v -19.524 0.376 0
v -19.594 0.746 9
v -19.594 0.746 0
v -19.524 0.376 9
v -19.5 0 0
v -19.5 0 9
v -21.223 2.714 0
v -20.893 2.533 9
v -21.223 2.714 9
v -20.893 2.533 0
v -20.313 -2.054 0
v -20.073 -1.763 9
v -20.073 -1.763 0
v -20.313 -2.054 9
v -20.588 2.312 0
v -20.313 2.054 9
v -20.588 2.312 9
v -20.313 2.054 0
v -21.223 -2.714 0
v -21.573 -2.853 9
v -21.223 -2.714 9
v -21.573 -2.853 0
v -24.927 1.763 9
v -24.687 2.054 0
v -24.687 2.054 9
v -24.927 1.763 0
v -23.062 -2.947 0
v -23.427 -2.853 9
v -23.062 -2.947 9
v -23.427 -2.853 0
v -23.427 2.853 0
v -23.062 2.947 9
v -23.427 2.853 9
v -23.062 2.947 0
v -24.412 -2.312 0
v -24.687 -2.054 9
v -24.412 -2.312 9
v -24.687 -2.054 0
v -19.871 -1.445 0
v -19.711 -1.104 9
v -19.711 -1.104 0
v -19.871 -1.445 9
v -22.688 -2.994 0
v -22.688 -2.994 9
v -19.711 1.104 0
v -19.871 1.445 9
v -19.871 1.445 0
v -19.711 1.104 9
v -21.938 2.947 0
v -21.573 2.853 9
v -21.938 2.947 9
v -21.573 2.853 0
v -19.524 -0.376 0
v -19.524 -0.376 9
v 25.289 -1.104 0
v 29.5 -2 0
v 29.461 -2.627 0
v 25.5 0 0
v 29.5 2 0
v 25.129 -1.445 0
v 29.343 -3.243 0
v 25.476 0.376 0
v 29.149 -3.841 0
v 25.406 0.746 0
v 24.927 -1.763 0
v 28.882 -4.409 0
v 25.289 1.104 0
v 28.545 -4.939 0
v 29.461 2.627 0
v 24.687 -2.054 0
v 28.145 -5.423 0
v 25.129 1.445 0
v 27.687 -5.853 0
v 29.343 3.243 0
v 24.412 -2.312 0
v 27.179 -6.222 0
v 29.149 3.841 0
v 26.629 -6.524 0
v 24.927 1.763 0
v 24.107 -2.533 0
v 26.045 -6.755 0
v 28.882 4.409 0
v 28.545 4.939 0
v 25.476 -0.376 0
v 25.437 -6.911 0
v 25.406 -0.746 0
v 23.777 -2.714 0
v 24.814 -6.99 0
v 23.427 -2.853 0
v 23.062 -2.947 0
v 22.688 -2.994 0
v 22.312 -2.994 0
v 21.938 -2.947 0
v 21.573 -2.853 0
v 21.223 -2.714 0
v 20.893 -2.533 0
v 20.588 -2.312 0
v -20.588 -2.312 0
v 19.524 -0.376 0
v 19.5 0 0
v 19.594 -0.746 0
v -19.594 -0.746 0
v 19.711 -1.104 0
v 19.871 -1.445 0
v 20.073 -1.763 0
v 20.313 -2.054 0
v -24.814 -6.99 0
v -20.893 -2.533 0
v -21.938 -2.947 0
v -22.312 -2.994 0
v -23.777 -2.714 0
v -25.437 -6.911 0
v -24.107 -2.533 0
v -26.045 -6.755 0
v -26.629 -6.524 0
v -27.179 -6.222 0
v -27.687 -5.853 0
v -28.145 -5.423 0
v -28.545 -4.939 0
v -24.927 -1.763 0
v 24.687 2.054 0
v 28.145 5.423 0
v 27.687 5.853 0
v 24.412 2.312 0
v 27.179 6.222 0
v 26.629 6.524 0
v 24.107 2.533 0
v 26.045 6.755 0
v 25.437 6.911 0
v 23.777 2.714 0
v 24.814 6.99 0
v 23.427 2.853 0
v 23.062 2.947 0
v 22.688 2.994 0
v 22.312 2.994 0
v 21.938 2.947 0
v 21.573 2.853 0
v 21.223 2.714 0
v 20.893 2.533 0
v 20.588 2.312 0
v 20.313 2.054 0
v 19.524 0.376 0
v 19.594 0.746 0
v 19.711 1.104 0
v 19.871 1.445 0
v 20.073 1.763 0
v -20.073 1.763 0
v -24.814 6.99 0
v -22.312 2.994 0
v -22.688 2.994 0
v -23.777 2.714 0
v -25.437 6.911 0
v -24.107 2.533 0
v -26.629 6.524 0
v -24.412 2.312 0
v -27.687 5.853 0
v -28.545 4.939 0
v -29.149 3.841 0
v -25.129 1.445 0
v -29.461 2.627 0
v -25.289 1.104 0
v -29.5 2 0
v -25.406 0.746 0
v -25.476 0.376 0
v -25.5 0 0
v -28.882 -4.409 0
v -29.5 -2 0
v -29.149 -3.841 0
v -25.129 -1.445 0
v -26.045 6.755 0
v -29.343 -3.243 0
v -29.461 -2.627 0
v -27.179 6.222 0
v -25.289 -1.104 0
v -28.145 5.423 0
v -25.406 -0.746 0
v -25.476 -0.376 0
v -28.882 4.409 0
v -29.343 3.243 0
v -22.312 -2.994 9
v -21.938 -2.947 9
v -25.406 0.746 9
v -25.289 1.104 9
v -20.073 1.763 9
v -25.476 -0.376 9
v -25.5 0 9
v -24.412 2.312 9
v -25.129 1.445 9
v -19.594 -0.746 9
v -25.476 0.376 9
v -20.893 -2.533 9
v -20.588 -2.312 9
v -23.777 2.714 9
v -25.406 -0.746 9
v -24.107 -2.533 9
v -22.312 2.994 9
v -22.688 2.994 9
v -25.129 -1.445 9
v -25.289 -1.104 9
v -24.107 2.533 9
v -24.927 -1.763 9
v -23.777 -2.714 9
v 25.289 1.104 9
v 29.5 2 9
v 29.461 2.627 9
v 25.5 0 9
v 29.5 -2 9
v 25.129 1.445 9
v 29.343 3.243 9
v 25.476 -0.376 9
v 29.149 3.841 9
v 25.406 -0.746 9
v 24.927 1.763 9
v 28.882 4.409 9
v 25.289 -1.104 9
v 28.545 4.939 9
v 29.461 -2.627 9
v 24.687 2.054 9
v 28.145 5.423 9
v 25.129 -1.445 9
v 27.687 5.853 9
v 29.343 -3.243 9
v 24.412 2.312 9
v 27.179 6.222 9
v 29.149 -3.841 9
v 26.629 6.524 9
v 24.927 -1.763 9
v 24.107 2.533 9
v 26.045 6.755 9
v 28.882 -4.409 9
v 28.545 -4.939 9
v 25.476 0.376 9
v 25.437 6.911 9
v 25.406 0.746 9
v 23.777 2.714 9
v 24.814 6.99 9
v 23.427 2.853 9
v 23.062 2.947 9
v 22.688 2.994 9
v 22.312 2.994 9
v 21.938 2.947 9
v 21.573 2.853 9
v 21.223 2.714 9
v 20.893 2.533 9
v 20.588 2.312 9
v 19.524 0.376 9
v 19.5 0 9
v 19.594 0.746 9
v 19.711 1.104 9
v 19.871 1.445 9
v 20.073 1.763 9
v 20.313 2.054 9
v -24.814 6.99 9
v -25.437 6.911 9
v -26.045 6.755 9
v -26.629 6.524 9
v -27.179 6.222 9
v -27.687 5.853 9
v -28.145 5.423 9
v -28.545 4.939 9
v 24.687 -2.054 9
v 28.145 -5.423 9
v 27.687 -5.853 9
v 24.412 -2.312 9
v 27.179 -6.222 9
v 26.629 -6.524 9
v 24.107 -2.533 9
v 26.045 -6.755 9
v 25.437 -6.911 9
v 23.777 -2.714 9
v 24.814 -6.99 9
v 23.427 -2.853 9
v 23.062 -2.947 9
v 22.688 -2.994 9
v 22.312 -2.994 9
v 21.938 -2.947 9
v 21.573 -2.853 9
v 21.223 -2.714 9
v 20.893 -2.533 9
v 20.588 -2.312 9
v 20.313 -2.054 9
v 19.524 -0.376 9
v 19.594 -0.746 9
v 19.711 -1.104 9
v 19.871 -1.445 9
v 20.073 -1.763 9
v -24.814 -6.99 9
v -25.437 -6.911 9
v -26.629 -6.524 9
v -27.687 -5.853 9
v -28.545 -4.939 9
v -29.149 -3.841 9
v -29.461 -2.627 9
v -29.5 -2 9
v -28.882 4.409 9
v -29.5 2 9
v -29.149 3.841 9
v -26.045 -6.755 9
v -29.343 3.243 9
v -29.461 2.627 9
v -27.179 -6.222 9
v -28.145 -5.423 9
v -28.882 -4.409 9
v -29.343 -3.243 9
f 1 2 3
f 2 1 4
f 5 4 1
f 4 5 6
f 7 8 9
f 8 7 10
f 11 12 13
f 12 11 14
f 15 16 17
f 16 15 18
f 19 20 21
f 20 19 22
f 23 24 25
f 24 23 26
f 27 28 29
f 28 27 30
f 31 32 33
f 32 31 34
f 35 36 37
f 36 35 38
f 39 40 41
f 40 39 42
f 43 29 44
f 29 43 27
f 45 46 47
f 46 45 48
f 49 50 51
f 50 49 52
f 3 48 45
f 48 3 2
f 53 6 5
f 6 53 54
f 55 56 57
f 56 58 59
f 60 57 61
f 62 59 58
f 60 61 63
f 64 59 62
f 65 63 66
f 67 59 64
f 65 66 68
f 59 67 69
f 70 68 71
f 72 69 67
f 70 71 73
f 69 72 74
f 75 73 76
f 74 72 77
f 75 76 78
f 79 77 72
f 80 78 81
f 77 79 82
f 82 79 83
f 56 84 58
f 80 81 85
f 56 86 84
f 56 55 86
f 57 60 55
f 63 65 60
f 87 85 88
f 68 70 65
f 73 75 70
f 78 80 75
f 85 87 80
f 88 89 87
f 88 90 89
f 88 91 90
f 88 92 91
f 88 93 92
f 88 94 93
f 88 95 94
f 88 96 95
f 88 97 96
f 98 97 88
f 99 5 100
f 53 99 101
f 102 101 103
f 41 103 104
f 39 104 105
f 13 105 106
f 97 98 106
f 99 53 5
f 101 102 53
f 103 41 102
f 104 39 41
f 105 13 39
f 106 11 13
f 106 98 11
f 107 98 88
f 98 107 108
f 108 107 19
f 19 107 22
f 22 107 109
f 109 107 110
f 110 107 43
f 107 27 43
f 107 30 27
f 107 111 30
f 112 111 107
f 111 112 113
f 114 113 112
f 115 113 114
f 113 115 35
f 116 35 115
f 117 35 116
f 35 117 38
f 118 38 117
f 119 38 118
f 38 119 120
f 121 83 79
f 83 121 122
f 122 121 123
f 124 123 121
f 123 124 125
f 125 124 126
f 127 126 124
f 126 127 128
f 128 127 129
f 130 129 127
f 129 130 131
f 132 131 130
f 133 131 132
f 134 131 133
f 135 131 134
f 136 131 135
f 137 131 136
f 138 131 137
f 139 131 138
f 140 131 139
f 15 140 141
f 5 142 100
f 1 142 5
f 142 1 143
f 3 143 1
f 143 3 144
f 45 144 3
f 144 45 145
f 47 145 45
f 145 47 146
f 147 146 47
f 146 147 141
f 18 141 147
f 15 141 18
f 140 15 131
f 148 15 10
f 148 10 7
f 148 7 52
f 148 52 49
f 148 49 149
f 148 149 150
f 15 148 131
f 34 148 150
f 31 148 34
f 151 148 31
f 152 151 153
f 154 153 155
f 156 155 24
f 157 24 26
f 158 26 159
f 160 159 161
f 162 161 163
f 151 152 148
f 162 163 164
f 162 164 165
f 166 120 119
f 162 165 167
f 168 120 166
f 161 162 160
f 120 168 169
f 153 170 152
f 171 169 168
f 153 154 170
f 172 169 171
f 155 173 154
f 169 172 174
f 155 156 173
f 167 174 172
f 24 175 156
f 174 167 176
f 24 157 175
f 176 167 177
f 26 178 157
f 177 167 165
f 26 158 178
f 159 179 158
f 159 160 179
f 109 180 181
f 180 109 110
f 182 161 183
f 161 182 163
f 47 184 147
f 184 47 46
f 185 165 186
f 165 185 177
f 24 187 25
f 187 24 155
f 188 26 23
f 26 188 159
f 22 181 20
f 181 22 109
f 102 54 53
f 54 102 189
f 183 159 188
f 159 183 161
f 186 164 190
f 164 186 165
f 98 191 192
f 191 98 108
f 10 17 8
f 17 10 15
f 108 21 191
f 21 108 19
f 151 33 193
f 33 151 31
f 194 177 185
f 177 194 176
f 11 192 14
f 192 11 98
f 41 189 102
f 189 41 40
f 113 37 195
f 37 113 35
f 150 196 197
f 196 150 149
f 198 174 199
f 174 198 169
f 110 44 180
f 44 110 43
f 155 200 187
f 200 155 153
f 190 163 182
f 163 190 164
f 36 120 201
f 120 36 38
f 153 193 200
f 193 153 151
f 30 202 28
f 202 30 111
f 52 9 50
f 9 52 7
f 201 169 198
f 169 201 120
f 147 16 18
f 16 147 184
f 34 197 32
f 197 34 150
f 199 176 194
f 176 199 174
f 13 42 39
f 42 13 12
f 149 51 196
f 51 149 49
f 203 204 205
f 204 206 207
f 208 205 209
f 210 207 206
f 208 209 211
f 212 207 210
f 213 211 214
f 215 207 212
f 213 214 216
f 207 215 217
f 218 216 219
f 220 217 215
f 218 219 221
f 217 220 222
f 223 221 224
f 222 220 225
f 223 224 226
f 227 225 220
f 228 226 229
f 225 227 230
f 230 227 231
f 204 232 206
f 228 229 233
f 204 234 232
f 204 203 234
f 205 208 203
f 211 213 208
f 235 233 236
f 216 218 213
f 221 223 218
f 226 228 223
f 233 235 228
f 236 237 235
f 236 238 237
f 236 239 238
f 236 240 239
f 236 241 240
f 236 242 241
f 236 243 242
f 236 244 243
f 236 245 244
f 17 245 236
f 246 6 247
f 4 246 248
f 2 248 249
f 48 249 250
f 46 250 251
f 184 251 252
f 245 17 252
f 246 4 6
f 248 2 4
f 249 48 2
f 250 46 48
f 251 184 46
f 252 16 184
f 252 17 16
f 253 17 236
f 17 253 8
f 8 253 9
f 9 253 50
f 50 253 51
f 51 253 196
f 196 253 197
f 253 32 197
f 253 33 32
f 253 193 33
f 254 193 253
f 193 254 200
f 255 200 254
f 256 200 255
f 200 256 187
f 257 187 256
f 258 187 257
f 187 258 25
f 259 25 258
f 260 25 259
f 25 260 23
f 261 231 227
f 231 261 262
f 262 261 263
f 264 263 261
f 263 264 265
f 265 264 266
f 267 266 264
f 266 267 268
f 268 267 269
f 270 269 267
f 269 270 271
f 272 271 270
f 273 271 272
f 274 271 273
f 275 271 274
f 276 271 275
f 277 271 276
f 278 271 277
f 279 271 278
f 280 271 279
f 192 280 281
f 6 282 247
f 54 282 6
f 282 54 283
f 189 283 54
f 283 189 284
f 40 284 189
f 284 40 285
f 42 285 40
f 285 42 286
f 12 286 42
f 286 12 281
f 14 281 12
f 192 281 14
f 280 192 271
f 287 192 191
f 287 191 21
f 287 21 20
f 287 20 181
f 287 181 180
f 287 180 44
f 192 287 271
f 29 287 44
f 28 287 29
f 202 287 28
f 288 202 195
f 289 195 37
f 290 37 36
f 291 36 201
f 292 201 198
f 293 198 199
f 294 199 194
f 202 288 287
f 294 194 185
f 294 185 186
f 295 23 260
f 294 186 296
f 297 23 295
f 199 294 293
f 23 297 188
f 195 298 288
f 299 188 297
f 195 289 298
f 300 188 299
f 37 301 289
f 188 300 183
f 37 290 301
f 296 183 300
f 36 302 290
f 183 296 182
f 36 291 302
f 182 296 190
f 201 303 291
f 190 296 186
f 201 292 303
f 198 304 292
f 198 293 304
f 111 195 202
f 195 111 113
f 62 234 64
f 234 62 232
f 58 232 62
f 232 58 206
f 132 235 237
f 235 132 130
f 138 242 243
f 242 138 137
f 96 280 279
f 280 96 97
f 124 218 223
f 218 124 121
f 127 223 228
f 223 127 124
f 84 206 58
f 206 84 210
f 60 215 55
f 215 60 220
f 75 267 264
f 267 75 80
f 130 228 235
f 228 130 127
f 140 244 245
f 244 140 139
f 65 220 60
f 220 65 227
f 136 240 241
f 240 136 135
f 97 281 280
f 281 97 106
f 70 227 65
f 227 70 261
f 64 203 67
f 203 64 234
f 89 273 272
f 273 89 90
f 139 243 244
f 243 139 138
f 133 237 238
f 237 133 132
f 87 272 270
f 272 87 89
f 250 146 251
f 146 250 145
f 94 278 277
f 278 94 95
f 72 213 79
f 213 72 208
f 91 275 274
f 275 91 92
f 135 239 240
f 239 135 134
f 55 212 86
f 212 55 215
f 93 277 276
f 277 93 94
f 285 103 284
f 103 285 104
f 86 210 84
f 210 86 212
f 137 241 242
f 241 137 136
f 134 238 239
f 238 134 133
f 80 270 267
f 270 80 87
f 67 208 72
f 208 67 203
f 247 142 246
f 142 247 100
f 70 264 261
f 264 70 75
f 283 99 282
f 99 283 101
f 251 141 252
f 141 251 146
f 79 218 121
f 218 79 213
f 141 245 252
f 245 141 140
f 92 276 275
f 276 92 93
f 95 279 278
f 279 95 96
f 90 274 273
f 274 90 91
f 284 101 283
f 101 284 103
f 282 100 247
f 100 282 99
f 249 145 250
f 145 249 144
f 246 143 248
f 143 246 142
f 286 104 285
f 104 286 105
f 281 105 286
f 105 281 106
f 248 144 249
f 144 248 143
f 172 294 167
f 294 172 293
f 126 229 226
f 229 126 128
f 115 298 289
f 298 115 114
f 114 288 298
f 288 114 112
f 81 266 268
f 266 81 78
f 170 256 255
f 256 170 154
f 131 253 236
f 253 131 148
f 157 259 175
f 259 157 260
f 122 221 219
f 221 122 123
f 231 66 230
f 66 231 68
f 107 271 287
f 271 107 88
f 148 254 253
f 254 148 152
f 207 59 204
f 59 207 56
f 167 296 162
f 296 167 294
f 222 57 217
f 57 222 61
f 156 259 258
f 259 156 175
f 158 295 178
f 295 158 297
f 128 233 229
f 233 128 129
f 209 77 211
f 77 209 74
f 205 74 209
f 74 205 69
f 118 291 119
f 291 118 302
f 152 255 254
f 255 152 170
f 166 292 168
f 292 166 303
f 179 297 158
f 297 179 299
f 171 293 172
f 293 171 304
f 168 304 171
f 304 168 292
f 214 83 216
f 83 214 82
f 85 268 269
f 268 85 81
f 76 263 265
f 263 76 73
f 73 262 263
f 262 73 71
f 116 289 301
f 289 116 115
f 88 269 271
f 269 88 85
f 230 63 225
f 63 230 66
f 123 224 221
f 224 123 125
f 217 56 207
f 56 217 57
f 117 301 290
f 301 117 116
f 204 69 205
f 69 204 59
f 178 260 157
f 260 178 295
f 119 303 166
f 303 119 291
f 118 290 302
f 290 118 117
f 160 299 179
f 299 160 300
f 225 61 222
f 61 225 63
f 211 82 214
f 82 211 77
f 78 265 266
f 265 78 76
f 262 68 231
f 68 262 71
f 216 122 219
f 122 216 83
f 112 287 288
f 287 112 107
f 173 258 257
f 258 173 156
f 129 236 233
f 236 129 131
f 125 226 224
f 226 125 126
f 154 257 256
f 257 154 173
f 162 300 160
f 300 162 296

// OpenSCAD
$fn = 50;


difference() {
	union() {
		hull() {
			translate(v = [-24.5000000000, 2.0000000000, 0]) {
				cylinder(h = 9, r = 5);
			}
			translate(v = [24.5000000000, 2.0000000000, 0]) {
				cylinder(h = 9, r = 5);
			}
			translate(v = [-24.5000000000, -2.0000000000, 0]) {
				cylinder(h = 9, r = 5);
			}
			translate(v = [24.5000000000, -2.0000000000, 0]) {
				cylinder(h = 9, r = 5);
			}
		}
	}
	union() {
		translate(v = [-22.5000000000, 0.0000000000, 0]) {
			cylinder(h = 9, r = 3.0000000000);
		}
		translate(v = [22.5000000000, 0.0000000000, 0]) {
			cylinder(h = 9, r = 3.0000000000);
		}
		translate(v = [-22.5000000000, 0.0000000000, 0]) {
			cylinder(h = 9, r = 1.5000000000);
		}
		translate(v = [22.5000000000, 0.0000000000, 0]) {
			cylinder(h = 9, r = 1.5000000000);
		}
		translate(v = [-22.5000000000, 0.0000000000, 0]) {
			cylinder(h = 9, r = 1.5000000000);
		}
		translate(v = [22.5000000000, 0.0000000000, 0]) {
			cylinder(h = 9, r = 1.5000000000);
		}
		translate(v = [-22.5000000000, 0.0000000000, 0]) {
			cylinder(h = 9, r = 1.5000000000);
		}
		translate(v = [22.5000000000, 0.0000000000, 0]) {
			cylinder(h = 9, r = 1.5000000000);
		}
	}
}
